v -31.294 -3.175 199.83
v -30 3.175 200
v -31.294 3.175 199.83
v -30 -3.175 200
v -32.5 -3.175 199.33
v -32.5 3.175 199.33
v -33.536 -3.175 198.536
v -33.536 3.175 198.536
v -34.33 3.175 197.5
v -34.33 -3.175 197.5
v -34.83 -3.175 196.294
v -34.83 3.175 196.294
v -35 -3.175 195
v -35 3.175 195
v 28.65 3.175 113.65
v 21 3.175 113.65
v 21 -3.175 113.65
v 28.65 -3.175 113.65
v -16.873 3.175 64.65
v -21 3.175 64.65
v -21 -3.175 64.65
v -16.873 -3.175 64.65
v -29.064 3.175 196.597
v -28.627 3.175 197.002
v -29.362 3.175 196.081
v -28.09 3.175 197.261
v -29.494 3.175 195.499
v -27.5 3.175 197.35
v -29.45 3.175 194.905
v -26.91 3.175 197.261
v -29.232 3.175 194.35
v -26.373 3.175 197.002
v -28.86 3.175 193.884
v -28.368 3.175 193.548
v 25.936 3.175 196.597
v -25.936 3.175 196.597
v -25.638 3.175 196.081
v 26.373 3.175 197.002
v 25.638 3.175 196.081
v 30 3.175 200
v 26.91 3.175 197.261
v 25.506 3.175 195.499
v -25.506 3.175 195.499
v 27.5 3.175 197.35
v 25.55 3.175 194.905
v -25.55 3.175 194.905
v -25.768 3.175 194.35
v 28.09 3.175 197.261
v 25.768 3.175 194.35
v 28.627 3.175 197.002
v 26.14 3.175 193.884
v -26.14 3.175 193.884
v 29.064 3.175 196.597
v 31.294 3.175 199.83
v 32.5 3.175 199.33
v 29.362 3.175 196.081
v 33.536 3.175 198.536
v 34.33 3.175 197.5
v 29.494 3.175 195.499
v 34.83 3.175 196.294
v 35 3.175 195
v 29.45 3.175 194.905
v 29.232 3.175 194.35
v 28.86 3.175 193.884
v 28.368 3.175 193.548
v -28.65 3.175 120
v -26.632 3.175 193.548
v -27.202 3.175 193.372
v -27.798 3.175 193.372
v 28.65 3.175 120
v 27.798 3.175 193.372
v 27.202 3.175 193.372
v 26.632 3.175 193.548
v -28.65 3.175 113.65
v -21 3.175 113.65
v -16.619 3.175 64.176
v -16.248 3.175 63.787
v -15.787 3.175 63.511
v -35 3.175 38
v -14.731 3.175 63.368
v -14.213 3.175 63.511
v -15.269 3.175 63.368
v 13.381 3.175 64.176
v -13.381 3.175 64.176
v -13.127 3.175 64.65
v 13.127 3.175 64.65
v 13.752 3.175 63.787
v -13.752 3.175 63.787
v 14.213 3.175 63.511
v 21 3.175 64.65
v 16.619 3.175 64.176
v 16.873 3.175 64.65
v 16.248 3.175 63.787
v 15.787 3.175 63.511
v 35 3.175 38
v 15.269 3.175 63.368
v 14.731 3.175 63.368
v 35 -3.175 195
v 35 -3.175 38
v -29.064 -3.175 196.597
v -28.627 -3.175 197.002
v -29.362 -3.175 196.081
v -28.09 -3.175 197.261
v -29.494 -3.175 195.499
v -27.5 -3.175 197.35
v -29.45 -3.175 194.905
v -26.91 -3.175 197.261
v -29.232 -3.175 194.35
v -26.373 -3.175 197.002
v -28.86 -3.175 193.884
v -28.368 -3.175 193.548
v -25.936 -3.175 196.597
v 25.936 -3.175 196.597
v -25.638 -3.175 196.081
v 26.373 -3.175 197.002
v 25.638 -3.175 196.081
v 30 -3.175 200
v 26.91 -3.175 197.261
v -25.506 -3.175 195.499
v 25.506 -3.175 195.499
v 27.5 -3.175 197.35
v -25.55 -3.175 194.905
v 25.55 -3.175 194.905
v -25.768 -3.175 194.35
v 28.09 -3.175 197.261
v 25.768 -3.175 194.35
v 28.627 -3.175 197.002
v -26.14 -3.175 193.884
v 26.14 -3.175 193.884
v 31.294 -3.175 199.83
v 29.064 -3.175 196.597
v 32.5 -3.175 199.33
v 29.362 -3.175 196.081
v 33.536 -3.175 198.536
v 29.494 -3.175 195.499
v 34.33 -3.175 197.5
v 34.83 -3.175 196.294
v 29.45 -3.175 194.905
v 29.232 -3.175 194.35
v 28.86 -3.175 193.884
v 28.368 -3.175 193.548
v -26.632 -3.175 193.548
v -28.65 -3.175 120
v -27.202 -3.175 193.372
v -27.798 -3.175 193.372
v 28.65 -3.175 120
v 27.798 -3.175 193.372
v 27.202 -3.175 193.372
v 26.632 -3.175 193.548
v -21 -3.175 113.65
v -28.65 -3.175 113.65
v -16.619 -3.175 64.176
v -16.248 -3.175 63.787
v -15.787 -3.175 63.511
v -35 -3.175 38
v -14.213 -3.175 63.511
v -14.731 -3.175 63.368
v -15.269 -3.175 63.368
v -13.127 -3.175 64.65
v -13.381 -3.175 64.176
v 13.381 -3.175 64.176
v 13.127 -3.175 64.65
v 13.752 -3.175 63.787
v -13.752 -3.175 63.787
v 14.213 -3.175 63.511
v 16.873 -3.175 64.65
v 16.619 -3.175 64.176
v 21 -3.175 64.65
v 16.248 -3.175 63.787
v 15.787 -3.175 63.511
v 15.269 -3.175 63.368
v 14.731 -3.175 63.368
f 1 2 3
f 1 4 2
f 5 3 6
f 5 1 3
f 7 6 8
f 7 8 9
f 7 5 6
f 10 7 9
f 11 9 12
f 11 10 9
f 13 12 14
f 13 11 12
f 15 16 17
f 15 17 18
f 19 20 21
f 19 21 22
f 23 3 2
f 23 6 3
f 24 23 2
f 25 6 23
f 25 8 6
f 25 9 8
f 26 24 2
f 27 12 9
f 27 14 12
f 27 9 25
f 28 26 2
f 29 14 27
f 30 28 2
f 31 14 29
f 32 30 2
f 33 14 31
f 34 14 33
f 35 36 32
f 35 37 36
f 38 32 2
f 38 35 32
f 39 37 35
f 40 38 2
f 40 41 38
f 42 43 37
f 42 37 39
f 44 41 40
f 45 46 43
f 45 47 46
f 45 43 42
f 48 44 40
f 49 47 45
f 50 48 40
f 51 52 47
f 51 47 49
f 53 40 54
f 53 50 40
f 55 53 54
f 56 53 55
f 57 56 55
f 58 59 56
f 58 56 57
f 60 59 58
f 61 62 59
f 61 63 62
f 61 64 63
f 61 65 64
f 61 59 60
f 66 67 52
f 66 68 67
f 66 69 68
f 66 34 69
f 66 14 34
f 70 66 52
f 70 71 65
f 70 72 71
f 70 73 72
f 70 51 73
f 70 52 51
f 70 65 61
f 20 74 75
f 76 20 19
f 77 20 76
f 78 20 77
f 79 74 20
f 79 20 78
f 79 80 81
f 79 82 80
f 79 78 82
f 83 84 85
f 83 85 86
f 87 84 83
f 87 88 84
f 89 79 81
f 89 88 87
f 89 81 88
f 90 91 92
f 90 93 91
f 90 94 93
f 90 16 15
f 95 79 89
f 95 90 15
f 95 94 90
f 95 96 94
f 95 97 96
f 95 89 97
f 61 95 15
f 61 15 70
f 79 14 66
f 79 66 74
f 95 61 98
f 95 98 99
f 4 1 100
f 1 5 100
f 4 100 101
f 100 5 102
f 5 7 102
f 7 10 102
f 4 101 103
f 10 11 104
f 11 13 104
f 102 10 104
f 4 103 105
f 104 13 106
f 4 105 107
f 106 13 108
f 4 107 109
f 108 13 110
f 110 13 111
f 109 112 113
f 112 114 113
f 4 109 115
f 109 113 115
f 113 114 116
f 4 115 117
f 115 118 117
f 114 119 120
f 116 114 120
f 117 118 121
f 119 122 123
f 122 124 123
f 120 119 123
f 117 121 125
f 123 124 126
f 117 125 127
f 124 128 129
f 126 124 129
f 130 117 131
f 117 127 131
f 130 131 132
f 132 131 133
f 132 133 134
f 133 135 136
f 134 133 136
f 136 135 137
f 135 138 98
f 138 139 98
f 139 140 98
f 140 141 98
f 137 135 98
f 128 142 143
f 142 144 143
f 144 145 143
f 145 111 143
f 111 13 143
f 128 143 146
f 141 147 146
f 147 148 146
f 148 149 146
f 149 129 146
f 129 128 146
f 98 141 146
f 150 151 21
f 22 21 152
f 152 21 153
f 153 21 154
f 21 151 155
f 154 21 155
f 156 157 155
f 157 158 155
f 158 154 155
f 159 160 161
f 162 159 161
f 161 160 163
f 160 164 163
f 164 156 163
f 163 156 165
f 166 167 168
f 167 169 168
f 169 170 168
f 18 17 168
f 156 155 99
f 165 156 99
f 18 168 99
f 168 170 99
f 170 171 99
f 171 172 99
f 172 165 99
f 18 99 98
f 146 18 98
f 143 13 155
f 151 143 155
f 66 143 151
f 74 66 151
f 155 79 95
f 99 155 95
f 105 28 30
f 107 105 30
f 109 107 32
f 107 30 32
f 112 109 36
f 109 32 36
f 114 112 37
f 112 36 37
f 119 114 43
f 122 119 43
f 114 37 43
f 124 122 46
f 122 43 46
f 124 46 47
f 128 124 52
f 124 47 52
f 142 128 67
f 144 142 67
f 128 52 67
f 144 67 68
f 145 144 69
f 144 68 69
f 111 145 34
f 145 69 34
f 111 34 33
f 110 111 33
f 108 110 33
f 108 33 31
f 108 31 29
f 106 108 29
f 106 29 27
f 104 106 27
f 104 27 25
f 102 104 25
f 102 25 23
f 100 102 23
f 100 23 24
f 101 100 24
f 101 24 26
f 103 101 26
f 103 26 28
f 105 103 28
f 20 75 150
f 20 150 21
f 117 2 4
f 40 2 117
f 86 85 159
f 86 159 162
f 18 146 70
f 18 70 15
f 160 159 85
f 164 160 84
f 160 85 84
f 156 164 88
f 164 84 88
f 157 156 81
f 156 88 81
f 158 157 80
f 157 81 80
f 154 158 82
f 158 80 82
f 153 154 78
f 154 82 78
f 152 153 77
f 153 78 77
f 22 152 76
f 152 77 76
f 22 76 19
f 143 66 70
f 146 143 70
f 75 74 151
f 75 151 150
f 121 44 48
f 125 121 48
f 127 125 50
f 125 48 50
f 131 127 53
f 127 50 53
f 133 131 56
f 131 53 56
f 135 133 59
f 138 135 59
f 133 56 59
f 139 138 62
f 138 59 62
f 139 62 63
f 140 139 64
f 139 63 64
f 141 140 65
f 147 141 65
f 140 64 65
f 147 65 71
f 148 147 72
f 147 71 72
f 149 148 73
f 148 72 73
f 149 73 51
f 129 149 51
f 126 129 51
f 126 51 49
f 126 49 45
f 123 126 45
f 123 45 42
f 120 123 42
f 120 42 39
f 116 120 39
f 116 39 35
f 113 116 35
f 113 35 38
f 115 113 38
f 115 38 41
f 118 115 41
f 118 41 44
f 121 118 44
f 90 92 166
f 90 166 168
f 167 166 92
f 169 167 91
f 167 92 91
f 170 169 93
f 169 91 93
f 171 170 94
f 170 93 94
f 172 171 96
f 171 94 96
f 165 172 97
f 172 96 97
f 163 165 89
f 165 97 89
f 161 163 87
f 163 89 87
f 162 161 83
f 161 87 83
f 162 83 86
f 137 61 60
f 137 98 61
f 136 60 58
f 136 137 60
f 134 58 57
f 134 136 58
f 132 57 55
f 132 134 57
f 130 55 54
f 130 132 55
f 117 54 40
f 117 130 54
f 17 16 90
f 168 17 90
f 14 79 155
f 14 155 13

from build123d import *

# Parameters (mm, degrees)
BOSS_EXTRUDE1_DEPTH = 3.175
CUT_EXTRUDE1_DEPTH  = 204.138678001
SKETCH3_W           = 42
SKETCH3_H           = 55.35
SKETCH3_W_2         = 7.65
SKETCH3_H_2         = 6.35
CUT_EXTRUDE2_DEPTH  = 204.138678001
FILLET3_R           = 5
SKETCH5_R           = 2
CUT_EXTRUDE4_DEPTH  = 204.138678001


with BuildPart() as part:
    # Sketch1 → Boss-Extrude1 (new, symmetric)
    with BuildSketch(Plane(origin=(0, 0, 0), x_dir=(1, 0, 0), z_dir=(0, 1, 0))):
        with BuildLine():
            Line((35, -200), (35, 0))
            ThreePointArc((35, 0), (0, 35), (-35, 0))
            Line((-35, 0), (-35, -200))
            Line((-35, -200), (35, -200))
        make_face()
    extrude(amount=BOSS_EXTRUDE1_DEPTH, both=True)

    # Sketch2 → Cut-Extrude1 (cut, through all)
    with BuildSketch(Plane(origin=(0, 3.175, 0), x_dir=(1, 0, 0), z_dir=(0, 1, 0))):
        with BuildLine():
            Line((-35, -38), (35, -38))
            Line((35, -38), (35, 0))
            ThreePointArc((35, 0), (0, 35), (-35, 0))
            Line((-35, 0), (-35, -38))
        make_face()
    extrude(amount=-CUT_EXTRUDE1_DEPTH, mode=Mode.SUBTRACT)

    # Sketch3 → Cut-Extrude2 (cut, through all)
    with BuildSketch(Plane(origin=(0, 3.175, 0), x_dir=(1, 0, 0), z_dir=(0, 1, 0))):
        with Locations((0, -92.325)):
            Rectangle(SKETCH3_W, SKETCH3_H)
        with Locations((-24.825, -116.825)):
            Rectangle(SKETCH3_W_2, SKETCH3_H_2)
        with Locations((24.825, -116.825)):
            Rectangle(SKETCH3_W_2, SKETCH3_H_2)
    extrude(amount=-CUT_EXTRUDE2_DEPTH, mode=Mode.SUBTRACT)

    # Fillet3
    fillet3_edges = [part.edges().sort_by_distance(p)[0] for p in [
        (35, 0, 200),
        (-35, 0, 200),
    ]]
    fillet(fillet3_edges, radius=FILLET3_R)

    # Sketch5 → Cut-Extrude4 (cut, through all)
    with BuildSketch(Plane(origin=(0, 3.175, 0), x_dir=(1, 0, 0), z_dir=(0, 1, 0))):
        with Locations(Location((27.5, -195.35, 0), (0, 0, 270))):
            Circle(SKETCH5_R)
        with Locations(Location((-27.5, -195.35, 0), (0, 0, 270))):
            Circle(SKETCH5_R)
        with Locations((15, -65.35)):
            Circle(SKETCH5_R)
        with Locations((-15, -65.35)):
            Circle(SKETCH5_R)
    extrude(amount=-CUT_EXTRUDE4_DEPTH, mode=Mode.SUBTRACT)


solid = part.part
